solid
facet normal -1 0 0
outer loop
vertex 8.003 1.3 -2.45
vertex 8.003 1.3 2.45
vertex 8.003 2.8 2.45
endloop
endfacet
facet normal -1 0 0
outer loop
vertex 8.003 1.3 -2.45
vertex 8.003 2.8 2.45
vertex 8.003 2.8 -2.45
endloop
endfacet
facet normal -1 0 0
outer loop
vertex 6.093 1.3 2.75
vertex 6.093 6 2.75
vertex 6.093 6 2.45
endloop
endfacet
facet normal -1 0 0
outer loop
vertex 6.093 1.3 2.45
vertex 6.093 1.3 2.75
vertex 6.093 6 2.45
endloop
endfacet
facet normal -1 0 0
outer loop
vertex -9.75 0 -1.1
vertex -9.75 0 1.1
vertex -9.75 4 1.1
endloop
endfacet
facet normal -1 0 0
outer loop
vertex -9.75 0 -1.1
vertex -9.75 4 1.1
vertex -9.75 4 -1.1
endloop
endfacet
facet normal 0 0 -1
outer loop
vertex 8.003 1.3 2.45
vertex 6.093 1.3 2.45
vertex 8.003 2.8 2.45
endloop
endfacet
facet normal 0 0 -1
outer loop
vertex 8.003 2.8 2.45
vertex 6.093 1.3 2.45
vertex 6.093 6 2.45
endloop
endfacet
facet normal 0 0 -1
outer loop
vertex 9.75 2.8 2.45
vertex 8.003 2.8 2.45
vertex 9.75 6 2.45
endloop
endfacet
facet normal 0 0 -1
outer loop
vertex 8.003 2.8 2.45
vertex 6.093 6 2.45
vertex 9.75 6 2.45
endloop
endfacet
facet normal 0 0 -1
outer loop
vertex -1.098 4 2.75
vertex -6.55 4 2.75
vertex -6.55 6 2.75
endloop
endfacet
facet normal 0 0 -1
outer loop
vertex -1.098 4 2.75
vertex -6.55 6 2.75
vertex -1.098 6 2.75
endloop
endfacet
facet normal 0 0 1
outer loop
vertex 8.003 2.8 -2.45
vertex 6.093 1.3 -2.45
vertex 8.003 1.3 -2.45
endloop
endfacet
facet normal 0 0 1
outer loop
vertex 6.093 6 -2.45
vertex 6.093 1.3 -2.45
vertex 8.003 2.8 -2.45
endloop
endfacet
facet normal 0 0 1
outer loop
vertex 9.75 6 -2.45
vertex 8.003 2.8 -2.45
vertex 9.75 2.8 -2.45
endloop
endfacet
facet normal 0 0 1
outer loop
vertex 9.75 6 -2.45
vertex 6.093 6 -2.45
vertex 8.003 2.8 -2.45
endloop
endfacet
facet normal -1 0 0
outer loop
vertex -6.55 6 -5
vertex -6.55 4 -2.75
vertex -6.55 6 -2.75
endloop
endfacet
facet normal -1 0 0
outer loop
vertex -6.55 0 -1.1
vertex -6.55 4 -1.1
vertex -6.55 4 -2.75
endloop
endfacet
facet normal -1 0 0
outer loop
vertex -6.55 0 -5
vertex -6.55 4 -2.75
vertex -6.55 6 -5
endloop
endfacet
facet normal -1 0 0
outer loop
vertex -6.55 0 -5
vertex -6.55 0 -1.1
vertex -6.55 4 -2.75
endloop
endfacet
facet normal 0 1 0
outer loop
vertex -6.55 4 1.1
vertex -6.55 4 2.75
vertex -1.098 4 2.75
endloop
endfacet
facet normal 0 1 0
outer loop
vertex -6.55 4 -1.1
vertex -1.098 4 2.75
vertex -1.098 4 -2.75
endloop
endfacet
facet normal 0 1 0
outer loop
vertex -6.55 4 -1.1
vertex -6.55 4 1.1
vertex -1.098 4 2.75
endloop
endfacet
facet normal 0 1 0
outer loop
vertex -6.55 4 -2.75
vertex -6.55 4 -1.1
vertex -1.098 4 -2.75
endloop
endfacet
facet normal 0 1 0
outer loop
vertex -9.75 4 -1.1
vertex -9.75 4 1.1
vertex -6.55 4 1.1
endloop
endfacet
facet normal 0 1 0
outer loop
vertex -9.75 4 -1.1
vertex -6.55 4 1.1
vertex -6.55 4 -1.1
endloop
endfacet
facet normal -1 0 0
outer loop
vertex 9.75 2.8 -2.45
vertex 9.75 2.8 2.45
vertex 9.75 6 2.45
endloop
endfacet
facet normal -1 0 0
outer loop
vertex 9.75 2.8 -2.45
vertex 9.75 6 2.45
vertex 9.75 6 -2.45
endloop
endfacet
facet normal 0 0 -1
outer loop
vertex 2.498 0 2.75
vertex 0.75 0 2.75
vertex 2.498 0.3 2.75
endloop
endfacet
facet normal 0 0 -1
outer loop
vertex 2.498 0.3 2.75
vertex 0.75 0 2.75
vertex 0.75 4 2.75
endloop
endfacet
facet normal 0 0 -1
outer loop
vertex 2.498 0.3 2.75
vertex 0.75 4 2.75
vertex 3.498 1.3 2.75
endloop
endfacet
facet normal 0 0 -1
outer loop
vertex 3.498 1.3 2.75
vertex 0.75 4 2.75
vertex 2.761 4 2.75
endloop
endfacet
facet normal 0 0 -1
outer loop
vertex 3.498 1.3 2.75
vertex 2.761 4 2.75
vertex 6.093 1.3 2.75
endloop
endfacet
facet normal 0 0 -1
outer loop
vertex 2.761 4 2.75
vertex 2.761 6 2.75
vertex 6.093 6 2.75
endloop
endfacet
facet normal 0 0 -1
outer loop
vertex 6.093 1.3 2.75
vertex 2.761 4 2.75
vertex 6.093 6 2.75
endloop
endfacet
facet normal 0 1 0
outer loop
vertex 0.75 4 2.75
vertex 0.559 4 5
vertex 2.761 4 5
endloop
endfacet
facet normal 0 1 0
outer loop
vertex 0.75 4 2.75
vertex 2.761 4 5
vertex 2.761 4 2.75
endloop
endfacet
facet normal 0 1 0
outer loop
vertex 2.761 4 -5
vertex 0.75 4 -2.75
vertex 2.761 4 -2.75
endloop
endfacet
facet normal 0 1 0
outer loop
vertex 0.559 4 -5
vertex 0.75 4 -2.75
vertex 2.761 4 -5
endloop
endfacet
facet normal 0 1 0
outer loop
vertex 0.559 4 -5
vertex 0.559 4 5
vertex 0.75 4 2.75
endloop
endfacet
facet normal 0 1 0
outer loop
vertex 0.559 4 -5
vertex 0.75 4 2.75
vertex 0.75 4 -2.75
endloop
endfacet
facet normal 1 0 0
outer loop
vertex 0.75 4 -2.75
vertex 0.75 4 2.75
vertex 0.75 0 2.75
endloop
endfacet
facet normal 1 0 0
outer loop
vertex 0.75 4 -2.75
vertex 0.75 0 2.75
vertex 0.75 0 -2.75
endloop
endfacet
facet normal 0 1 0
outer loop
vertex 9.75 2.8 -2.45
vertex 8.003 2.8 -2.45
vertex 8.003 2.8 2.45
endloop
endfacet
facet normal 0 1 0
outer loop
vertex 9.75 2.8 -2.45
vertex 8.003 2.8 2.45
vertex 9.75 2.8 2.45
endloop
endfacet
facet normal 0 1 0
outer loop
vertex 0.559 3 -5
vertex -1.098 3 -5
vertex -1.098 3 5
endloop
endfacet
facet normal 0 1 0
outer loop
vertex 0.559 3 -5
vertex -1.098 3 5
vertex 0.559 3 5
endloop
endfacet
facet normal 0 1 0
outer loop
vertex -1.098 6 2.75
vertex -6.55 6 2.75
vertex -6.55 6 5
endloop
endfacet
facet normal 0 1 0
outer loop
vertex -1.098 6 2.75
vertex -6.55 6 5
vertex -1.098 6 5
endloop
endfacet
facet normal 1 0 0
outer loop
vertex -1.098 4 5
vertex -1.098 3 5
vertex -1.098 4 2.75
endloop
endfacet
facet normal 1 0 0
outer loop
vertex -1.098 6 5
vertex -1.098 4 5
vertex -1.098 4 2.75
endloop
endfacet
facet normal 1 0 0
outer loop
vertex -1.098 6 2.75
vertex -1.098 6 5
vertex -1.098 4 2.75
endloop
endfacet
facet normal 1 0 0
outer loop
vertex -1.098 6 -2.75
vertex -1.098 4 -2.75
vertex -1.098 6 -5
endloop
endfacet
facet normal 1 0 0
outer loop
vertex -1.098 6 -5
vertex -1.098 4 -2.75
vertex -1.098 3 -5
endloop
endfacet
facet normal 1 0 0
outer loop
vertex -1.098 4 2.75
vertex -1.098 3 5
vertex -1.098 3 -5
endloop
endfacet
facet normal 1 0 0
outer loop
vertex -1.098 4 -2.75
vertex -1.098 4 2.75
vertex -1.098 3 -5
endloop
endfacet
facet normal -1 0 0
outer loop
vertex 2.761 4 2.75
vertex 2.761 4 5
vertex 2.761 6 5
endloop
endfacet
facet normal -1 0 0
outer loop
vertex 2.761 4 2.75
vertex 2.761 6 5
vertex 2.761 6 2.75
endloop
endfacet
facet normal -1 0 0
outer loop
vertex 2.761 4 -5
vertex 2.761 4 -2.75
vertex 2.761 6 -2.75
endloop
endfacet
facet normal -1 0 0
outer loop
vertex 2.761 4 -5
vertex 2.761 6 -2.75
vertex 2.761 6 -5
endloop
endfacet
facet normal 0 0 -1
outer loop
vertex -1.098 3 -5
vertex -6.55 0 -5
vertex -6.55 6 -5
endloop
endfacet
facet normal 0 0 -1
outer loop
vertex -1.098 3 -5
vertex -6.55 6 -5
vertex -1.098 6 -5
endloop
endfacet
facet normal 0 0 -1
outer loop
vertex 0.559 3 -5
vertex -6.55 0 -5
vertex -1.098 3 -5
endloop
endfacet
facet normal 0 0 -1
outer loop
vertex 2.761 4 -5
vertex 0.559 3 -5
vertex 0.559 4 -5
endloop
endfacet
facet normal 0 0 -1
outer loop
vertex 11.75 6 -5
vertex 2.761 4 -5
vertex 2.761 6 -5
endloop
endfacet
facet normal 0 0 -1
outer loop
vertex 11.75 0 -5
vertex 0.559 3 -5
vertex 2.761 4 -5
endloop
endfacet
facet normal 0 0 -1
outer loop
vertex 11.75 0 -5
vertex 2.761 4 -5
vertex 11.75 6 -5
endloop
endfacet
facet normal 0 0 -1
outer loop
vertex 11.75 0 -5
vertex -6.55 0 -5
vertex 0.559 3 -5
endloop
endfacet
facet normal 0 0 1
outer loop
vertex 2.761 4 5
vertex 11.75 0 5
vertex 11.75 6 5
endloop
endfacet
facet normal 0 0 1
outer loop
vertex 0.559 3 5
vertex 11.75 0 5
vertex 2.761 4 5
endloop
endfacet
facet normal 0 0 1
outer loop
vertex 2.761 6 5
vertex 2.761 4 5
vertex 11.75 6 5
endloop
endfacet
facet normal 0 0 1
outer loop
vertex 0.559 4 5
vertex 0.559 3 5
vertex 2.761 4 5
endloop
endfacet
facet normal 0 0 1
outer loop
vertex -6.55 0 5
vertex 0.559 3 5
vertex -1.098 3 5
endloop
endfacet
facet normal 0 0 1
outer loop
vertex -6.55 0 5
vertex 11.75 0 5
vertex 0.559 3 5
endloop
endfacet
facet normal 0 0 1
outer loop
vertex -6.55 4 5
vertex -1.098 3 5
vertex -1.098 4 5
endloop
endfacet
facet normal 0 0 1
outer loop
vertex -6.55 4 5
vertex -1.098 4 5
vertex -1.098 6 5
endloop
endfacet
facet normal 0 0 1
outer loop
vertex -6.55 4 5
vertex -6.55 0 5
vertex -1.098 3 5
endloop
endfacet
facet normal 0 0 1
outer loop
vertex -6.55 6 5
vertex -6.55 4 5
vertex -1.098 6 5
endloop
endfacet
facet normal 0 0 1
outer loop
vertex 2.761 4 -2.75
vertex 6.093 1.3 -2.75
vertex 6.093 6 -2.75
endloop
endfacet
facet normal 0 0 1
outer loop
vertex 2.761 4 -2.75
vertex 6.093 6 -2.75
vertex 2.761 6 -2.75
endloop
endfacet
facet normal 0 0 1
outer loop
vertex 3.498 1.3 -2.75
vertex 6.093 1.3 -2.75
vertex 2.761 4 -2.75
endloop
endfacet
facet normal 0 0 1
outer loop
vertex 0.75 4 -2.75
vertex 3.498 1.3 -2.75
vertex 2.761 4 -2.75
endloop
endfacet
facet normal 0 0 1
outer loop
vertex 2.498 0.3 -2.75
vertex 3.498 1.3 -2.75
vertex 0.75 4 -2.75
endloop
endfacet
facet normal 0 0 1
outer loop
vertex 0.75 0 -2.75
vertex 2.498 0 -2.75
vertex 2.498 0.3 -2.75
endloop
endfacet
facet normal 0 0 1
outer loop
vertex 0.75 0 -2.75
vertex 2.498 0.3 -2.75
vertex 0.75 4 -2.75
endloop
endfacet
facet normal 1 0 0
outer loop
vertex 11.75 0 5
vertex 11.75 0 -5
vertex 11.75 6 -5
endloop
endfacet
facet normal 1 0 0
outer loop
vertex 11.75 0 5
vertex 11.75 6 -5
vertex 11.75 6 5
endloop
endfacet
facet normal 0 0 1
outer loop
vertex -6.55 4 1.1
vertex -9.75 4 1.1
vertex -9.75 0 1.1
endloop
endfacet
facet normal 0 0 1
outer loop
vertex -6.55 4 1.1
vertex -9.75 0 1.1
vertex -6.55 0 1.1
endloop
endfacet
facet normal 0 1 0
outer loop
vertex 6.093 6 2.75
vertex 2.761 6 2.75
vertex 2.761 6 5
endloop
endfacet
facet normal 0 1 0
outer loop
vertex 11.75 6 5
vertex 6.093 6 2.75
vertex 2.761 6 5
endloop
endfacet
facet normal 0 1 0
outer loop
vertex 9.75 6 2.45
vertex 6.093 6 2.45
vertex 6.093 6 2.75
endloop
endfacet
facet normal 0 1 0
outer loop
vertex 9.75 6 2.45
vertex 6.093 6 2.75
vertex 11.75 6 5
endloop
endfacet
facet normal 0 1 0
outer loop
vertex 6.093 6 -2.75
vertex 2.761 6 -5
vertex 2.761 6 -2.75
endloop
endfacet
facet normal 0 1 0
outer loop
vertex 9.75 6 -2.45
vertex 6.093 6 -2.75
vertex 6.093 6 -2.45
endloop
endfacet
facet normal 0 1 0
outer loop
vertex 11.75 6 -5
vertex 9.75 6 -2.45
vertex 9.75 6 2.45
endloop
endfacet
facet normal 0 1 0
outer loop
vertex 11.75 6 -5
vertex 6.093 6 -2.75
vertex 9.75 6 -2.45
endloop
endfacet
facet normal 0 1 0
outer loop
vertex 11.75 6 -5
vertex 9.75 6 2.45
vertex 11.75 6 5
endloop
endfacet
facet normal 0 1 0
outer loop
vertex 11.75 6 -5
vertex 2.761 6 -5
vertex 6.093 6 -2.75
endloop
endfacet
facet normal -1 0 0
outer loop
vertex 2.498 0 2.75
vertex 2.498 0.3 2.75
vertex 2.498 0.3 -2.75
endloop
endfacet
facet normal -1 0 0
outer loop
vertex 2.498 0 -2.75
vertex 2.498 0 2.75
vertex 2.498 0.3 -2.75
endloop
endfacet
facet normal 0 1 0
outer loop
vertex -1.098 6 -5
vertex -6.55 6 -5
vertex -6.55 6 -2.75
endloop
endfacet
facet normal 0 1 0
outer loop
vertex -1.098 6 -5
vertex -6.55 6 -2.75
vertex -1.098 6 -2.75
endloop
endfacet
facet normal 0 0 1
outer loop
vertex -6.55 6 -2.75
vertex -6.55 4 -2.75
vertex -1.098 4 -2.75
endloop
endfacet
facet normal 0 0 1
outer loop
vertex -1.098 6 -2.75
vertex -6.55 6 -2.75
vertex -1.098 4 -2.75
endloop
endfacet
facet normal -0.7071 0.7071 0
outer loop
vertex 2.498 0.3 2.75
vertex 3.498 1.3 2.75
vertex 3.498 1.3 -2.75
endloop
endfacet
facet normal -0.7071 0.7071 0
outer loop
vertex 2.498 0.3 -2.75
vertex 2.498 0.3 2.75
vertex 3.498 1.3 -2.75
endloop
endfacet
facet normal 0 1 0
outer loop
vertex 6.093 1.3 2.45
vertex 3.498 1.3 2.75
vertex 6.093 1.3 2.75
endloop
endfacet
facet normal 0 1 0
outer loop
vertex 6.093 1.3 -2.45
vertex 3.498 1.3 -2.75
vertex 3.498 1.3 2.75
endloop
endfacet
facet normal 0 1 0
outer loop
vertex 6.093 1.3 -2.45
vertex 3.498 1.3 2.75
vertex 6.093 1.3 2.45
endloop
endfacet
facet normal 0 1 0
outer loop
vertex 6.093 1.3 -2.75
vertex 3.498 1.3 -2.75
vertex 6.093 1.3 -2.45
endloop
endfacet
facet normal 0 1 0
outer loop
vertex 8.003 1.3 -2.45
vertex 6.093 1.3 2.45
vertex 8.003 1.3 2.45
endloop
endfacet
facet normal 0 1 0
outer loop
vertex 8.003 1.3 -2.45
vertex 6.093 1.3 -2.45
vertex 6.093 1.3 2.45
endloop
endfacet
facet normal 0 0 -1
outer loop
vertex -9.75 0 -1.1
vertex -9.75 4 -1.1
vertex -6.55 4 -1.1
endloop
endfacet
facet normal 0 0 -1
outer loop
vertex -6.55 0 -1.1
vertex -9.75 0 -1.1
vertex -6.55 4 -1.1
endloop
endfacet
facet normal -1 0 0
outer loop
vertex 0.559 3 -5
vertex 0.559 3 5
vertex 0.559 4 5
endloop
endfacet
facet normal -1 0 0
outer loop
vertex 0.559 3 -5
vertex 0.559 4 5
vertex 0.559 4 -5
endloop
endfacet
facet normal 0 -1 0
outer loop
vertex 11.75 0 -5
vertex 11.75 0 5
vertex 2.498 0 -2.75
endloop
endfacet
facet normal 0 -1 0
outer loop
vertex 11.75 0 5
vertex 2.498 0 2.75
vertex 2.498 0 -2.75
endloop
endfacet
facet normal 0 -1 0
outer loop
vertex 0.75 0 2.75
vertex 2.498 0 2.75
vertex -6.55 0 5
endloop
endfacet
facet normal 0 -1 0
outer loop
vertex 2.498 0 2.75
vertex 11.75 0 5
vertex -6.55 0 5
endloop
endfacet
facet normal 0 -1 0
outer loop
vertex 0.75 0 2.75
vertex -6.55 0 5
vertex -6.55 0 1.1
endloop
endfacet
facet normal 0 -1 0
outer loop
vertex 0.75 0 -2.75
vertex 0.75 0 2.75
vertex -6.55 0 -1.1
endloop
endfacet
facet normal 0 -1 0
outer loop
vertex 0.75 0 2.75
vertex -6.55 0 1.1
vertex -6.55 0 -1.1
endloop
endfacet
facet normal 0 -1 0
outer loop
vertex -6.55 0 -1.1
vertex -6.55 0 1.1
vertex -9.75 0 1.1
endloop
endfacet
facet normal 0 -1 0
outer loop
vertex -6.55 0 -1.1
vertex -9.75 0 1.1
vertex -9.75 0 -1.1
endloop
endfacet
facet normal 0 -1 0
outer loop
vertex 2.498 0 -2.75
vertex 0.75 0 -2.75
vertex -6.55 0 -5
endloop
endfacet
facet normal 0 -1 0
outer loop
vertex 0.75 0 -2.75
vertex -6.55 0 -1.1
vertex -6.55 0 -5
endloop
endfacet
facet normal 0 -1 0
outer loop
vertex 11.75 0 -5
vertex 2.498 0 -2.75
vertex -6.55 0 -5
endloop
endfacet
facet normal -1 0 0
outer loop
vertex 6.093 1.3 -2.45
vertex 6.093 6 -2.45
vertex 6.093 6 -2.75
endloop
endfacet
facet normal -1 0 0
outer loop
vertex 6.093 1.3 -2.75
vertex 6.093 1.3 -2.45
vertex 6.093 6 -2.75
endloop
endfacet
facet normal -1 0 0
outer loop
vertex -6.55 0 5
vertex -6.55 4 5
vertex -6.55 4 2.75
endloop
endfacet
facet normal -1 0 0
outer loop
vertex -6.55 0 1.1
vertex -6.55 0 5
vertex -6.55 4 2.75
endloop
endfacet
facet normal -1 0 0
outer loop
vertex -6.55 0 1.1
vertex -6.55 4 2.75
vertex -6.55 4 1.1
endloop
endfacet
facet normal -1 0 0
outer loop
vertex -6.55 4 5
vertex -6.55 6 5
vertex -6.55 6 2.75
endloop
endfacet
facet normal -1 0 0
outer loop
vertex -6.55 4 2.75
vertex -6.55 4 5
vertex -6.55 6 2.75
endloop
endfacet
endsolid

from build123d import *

# Parameters (mm, degrees)
SKETCH1_W               = 19.5
SKETCH1_H               = 10
BOSS_EXTRUDE1_DEPTH     = 4
SKETCH2_W               = 9
SKETCH2_H               = 5.5
CUT_EXTRUDE1_DEPTH      = 2.7
SKETCH3_W               = 3.2
SKETCH3_H               = 3.9
CUT_EXTRUDE2_DEPTH      = 12.664583147
SKETCH4_W               = 1.747901038
SKETCH4_H               = 5.5
CUT_EXTRUDE3_DEPTH      = 12.285056491
CHAMFER2_SIZE           = 1
SKETCH5_W               = 10
SKETCH5_H               = 4
BOSS_EXTRUDE2_DEPTH     = 2
SKETCH6_W               = 1.747077863
SKETCH6_H               = 5.5
BOSS_EXTRUDE3_DEPTH     = 1.5
BOSS_EXTRUDE4_DEPTH     = 2
BOSS_EXTRUDE5_REACH     = 16.109
SKETCH9_W               = 3.657403566
SKETCH9_H               = 0.3
SKETCH10_W              = 5.81497097
SKETCH10_H              = 2.25
SKETCH10_W_2            = 5.452409629
BOSS_EXTRUDE6_DEPTH     = 2
CUT_EXTRUDE4_DEPTH      = 3.8
CUT_EXTRUDE4_DEPTH_BACK = 1
SKETCH12_W              = 1.656525066
SKETCH12_H              = 10


with BuildPart() as part:
    # Sketch1 → Boss-Extrude1 (new body)
    with BuildSketch(Plane(origin=(0, 0, 0), x_dir=(1, 0, 0), z_dir=(0, 1, 0))):
        Rectangle(SKETCH1_W, SKETCH1_H)
    extrude(amount=BOSS_EXTRUDE1_DEPTH)

    # Sketch2 → Cut-Extrude1 (cut)
    with BuildSketch(Plane(origin=(0, 4, 0), x_dir=(1, 0, 0), z_dir=(0, 1, 0))):
        with Locations((5.25, 0)):
            Rectangle(SKETCH2_W, SKETCH2_H)
    extrude(amount=-CUT_EXTRUDE1_DEPTH, mode=Mode.SUBTRACT)

    # Sketch3 → Cut-Extrude2 (cut, through all)
    with BuildSketch(Plane(origin=(0, 4, 0), x_dir=(1, 0, 0), z_dir=(0, 1, 0))):
        with Locations((-8.15, 3.05)):
            Rectangle(SKETCH3_W, SKETCH3_H)
        with Locations((-8.15, -3.05)):
            Rectangle(SKETCH3_W, SKETCH3_H)
    extrude(amount=-CUT_EXTRUDE2_DEPTH, mode=Mode.SUBTRACT)

    # Sketch4 → Cut-Extrude3 (cut, through all)
    with BuildSketch(Plane(origin=(0, 1.3, 0), x_dir=(1, 0, 0), z_dir=(0, 1, 0))):
        with Locations((1.623950519, 0)):
            Rectangle(SKETCH4_W, SKETCH4_H)
    extrude(amount=-CUT_EXTRUDE3_DEPTH, mode=Mode.SUBTRACT)

    # Chamfer2
    chamfer2_edges = [part.edges().sort_by_distance(p)[0] for p in [
        (2.497901038, 1.3, 0),
    ]]
    chamfer(chamfer2_edges, length=CHAMFER2_SIZE)

    # Sketch5 → Boss-Extrude2 (add)
    with BuildSketch(Plane(origin=(9.75, 0, 0), x_dir=(0, 0, -1), z_dir=(1, 0, 0))):
        with Locations((0, 2)):
            Rectangle(SKETCH5_W, SKETCH5_H)
    extrude(amount=BOSS_EXTRUDE2_DEPTH)

    # Sketch6 → Boss-Extrude3 (add)
    with BuildSketch(Plane(origin=(0, 1.3, 0), x_dir=(1, 0, 0), z_dir=(0, 1, 0))):
        with Locations((8.876461068, 0)):
            Rectangle(SKETCH6_W, SKETCH6_H)
    extrude(amount=BOSS_EXTRUDE3_DEPTH)

    # Sketch7 → Boss-Extrude4 (add)
    with BuildSketch(Plane(origin=(0, 4, 0), x_dir=(1, 0, 0), z_dir=(0, 1, 0))):
        Polygon((2.760699465, 2.75), (2.760699465, 5), (11.75, 5), (11.75, -5), (2.760699465, -5), (2.760699465, -2.75), (9.75, -2.75), (9.75, 2.75), align=None)
    extrude(amount=BOSS_EXTRUDE4_DEPTH)

    # Sketch9 → Boss-Extrude5 (add, up to next)
    with BuildSketch(Plane(origin=(0, 6, 0), x_dir=(1, 0, 0), z_dir=(0, 1, 0)), mode=Mode.PRIVATE) as boss_extrude5_sk1:
        with Locations((7.921298217, 2.6)):
            Rectangle(SKETCH9_W, SKETCH9_H)
    boss_extrude5_tool1 = extrude(boss_extrude5_sk1.sketch, amount=-BOSS_EXTRUDE5_REACH, mode=Mode.PRIVATE) - part.part
    # Sketch9 → Boss-Extrude5 (add, up to next)
    with BuildSketch(Plane(origin=(0, 6, 0), x_dir=(1, 0, 0), z_dir=(0, 1, 0)), mode=Mode.PRIVATE) as boss_extrude5_sk2:
        with Locations((7.921298217, -2.6)):
            Rectangle(SKETCH9_W, SKETCH9_H)
    boss_extrude5_tool2 = extrude(boss_extrude5_sk2.sketch, amount=-BOSS_EXTRUDE5_REACH, mode=Mode.PRIVATE) - part.part
    add(boss_extrude5_tool1.solids().sort_by_distance((7.921298, 6, -2.6))[0])
    add(boss_extrude5_tool2.solids().sort_by_distance((7.921298, 6, 2.6))[0])

    # Sketch10 → Boss-Extrude6 (add)
    with BuildSketch(Plane(origin=(0, 4, 0), x_dir=(1, 0, 0), z_dir=(0, 1, 0))):
        with Locations((-3.642514515, 3.875)):
            Rectangle(SKETCH10_W, SKETCH10_H)
        with Locations((-3.823795186, -3.875)):
            Rectangle(SKETCH10_W_2, SKETCH10_H)
    extrude(amount=BOSS_EXTRUDE6_DEPTH)

    # Sketch12 → Cut-Extrude4 (cut, two sides: drawn at the far end of the back side and taken through both)
    with BuildSketch(Plane(origin=(0, 4, 0), x_dir=(1, 0, 0), z_dir=(0, 1, 0)).offset(-CUT_EXTRUDE4_DEPTH_BACK)):
        with Locations((-0.269327838, 0)):
            Rectangle(SKETCH12_W, SKETCH12_H)
    extrude(amount=CUT_EXTRUDE4_DEPTH + CUT_EXTRUDE4_DEPTH_BACK, mode=Mode.SUBTRACT)


solid = part.part
